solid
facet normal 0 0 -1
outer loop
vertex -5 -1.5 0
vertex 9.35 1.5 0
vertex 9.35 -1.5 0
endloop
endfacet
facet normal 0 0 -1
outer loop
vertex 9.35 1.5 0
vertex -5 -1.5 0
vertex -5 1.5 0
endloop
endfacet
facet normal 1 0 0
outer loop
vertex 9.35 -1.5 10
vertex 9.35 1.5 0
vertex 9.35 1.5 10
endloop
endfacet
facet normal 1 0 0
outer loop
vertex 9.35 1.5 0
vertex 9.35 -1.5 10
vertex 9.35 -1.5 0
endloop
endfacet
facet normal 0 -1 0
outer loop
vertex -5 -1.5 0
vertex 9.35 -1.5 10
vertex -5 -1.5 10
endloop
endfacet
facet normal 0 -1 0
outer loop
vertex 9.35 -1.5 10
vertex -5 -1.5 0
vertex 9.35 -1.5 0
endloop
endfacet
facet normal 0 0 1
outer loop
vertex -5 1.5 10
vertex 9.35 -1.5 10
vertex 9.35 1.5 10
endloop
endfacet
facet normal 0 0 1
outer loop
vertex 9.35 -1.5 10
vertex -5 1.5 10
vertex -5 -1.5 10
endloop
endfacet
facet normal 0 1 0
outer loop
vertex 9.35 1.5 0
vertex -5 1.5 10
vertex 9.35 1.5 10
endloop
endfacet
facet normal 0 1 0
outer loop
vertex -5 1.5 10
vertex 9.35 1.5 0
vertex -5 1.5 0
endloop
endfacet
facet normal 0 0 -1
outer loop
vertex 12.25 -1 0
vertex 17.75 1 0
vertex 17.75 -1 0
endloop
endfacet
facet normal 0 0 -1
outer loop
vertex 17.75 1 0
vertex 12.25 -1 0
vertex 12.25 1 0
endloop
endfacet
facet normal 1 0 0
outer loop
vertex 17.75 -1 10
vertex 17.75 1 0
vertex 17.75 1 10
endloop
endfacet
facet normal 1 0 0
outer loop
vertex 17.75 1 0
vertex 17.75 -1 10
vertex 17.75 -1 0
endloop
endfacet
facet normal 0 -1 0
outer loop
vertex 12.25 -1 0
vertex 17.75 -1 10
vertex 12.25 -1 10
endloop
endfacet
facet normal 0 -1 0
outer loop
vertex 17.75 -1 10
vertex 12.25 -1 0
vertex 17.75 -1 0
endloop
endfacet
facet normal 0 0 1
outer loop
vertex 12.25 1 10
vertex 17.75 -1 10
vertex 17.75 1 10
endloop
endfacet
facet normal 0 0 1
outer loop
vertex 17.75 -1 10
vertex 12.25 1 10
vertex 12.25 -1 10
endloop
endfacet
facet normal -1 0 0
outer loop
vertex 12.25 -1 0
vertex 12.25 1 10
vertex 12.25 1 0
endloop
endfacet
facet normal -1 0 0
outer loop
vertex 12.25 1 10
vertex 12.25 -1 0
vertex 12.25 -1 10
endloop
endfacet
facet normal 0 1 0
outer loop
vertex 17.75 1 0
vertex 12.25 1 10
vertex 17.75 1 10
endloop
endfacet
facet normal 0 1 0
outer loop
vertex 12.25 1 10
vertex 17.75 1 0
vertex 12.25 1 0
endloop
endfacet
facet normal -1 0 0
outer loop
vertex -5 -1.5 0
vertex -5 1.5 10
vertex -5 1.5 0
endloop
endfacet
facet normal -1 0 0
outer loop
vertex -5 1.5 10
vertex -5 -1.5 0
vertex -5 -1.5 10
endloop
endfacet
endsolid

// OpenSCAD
// Built by bench/smallmodels/features/compiler.py from a list of features.
$fn = 64;
difference() {
  union() {
    translate([0, 0, 0]) linear_extrude(height = 10) polygon([[-9.35, -1.5], [9.35, -1.5], [9.35, 1.5], [-9.35, 1.5]]);
    translate([15, 0, 0]) linear_extrude(height = 10) polygon([[-2.75, -1], [2.75, -1], [2.75, 1], [-2.75, 1]]);
  }
  union() {
    translate([-10, 0, 0]) rotate([0, 0, 0]) translate([-5, -5, 0]) cube([10, 10, 10]);
    translate([25, 0, 0]) rotate([0, 0, 0]) translate([-5, -5, 0]) cube([10, 10, 10]);
  }
}
